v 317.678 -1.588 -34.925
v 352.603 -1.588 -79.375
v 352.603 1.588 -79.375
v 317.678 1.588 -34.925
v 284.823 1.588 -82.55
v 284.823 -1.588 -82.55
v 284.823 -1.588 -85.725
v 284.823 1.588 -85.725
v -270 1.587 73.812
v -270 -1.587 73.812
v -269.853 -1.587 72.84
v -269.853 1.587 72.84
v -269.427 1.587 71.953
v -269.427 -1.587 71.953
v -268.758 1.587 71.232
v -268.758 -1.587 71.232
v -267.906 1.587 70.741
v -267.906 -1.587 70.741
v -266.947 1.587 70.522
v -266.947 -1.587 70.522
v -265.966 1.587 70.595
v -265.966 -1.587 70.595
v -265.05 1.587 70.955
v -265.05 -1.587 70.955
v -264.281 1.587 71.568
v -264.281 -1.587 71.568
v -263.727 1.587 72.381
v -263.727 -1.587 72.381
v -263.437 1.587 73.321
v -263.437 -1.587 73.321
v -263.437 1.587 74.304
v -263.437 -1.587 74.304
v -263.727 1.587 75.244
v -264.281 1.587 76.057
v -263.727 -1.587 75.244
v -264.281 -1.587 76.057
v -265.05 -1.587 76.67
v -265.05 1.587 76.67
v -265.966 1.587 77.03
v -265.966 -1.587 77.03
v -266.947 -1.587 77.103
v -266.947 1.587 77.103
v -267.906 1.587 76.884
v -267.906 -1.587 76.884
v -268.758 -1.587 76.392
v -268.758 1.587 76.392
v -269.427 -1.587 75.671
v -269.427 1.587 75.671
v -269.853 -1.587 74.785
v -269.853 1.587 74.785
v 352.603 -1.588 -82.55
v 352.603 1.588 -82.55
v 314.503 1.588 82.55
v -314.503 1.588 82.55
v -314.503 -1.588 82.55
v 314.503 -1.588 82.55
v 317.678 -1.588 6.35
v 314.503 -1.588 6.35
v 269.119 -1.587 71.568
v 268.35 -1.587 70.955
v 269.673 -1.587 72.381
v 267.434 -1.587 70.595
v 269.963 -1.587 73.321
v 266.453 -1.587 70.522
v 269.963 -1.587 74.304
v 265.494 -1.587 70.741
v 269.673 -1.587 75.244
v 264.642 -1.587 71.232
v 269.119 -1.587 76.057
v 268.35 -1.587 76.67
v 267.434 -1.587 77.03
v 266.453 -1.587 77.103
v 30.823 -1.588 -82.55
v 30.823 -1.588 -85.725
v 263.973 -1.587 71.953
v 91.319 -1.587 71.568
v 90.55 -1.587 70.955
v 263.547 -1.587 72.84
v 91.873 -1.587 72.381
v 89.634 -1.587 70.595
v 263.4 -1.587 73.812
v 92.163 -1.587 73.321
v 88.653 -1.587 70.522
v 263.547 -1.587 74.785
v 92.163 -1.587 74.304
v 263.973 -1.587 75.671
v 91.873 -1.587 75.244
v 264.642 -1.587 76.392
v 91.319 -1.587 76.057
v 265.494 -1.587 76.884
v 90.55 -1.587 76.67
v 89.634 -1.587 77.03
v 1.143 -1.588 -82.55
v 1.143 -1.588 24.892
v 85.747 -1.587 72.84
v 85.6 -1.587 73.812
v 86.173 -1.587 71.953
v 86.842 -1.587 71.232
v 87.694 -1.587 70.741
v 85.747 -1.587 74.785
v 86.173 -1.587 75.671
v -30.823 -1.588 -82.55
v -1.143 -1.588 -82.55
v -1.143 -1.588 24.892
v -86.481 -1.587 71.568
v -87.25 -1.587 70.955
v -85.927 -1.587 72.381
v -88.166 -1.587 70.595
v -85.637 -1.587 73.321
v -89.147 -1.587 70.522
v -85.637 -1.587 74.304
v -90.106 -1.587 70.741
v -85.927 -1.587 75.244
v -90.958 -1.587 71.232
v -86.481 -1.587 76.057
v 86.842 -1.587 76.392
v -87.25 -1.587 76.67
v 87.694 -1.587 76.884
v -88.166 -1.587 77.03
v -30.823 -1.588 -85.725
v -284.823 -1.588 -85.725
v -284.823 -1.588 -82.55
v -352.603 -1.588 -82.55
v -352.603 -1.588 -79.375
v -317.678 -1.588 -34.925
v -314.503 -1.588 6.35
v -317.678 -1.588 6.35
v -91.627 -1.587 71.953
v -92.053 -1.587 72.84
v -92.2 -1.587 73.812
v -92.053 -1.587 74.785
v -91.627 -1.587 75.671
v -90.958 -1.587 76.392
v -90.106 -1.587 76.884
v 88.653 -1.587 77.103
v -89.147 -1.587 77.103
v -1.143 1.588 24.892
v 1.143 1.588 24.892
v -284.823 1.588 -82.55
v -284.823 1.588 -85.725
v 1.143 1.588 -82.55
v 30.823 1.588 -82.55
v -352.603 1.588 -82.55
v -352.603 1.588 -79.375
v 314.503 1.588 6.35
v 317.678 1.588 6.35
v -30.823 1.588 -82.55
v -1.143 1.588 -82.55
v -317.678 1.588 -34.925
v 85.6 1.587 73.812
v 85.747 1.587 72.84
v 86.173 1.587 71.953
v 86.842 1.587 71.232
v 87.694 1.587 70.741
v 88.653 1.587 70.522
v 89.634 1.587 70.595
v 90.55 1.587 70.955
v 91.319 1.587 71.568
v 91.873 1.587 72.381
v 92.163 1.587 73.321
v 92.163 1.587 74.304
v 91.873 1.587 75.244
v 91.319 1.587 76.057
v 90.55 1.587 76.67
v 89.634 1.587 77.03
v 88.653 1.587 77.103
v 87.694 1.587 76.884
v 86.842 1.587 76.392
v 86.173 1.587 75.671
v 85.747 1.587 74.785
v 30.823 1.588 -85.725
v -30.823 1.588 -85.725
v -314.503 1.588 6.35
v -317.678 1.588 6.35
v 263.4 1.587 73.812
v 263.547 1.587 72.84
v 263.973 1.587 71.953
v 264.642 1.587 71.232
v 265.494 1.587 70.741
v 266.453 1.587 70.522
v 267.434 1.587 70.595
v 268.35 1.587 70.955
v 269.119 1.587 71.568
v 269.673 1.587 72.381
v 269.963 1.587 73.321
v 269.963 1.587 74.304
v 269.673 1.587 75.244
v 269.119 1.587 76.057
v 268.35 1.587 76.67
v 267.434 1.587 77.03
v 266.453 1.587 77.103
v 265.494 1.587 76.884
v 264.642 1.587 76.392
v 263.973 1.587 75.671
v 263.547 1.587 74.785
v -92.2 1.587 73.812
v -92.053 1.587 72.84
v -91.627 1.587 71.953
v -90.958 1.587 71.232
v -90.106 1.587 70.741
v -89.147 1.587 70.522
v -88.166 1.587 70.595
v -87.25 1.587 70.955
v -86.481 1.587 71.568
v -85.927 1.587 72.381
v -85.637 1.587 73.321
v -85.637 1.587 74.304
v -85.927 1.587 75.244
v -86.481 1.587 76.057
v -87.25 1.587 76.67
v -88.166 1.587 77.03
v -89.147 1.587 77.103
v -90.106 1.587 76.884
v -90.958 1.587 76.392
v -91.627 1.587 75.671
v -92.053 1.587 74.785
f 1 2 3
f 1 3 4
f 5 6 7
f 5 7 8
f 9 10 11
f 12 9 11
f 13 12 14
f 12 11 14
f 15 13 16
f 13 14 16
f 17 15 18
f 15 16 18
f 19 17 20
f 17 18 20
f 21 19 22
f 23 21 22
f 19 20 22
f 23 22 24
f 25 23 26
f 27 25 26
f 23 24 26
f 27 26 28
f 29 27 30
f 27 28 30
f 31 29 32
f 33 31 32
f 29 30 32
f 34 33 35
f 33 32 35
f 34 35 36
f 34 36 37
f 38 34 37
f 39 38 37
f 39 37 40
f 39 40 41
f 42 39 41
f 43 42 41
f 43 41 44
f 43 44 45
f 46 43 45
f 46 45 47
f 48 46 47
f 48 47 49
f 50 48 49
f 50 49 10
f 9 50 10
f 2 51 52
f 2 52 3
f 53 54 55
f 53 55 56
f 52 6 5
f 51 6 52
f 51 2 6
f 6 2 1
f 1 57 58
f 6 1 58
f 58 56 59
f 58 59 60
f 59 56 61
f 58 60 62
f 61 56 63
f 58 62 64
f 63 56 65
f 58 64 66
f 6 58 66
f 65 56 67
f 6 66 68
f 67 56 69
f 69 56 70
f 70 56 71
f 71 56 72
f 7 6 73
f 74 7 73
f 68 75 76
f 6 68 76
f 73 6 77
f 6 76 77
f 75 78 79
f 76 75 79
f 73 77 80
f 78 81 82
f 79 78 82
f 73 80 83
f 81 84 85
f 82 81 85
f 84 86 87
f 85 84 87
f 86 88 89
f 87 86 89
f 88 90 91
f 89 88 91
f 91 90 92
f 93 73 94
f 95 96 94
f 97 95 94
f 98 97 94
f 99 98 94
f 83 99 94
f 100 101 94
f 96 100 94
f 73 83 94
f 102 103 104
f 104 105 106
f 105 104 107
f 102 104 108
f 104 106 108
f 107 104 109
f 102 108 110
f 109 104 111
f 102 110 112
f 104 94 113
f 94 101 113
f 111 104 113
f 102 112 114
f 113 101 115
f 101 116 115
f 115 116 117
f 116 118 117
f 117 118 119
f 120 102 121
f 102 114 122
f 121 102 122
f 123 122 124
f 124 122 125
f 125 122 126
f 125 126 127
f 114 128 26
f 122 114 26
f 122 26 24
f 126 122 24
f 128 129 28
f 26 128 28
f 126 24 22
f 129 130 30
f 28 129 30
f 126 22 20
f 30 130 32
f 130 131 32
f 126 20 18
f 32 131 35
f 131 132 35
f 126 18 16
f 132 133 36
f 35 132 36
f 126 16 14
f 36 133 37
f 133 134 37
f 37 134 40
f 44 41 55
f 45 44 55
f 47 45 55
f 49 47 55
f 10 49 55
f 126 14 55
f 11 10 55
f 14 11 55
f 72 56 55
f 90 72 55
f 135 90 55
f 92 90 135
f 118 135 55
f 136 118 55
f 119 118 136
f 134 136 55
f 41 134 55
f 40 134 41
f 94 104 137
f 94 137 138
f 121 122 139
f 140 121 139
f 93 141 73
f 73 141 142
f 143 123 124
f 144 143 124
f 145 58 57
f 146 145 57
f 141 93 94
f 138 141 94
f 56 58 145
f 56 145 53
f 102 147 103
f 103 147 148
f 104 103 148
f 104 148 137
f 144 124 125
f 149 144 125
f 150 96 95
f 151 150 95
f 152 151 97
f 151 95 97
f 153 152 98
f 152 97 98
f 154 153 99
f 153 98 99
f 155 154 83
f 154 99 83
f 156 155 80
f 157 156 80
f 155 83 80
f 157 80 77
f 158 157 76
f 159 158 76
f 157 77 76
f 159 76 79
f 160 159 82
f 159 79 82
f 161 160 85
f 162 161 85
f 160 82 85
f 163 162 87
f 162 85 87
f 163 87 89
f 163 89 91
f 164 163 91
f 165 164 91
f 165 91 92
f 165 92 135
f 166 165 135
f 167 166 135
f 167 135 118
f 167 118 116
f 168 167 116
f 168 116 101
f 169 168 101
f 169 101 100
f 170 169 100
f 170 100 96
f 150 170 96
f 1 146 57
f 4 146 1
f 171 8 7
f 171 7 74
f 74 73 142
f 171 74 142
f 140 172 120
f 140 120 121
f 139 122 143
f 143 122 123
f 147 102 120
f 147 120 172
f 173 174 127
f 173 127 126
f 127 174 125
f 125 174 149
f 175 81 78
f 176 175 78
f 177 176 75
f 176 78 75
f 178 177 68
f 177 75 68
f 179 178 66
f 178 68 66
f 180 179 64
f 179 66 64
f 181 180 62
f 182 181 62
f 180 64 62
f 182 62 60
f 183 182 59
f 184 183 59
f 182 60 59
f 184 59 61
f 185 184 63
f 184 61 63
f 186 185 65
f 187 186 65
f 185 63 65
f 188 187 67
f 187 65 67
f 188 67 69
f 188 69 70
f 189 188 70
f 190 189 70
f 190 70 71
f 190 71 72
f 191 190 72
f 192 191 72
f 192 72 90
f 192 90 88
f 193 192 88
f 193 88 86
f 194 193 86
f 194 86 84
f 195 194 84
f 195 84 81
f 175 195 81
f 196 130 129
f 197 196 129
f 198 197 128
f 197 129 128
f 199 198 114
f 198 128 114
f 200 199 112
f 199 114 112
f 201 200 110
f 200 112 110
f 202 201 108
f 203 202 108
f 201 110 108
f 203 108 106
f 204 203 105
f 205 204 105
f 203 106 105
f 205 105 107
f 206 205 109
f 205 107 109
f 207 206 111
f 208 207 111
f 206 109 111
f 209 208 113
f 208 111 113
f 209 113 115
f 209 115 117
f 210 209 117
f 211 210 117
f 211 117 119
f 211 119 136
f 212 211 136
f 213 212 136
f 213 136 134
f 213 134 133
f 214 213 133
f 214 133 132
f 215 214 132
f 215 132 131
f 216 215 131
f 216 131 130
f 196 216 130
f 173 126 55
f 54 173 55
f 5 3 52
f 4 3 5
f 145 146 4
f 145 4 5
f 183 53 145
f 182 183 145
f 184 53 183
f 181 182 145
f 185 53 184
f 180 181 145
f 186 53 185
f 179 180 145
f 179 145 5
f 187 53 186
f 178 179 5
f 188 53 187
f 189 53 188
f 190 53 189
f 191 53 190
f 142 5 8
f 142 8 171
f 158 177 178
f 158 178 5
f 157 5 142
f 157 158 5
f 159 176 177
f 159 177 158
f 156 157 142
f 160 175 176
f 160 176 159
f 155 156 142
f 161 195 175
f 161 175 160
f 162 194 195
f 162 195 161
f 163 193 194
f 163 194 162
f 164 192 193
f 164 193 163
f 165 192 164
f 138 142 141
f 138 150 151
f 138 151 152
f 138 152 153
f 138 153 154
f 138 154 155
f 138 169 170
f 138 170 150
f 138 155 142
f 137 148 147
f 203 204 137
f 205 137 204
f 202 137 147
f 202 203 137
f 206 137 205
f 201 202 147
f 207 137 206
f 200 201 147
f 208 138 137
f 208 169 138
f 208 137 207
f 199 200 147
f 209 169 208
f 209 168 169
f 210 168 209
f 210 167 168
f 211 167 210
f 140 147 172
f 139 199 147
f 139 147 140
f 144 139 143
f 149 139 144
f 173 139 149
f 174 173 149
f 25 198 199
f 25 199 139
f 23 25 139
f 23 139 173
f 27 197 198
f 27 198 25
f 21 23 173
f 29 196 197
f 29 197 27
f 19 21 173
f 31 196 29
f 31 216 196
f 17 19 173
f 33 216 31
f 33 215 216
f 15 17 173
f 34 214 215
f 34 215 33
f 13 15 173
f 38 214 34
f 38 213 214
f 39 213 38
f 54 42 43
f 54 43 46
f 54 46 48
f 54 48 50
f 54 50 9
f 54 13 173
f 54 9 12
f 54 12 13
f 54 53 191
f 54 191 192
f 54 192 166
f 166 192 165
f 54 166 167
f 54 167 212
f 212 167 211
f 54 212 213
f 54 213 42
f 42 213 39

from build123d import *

# Parameters (mm, degrees)
SKETCH1_W            = 635.3556
SKETCH1_H            = 165.1
BOSS_EXTRUDE1_DEPTH  = 1.5875
SKETCH2_W            = 254
SKETCH2_H            = 3.175
BOSS_EXTRUDE2_DEPTH  = 3.175
BOSS_EXTRUDE3_DEPTH  = 3.175
SKETCH5_W            = 3.175
SKETCH5_H            = 76.2
SKETCH5_W_2          = 2.286
SKETCH5_H_2          = 107.442
CUT_EXTRUDE2_DEPTH   = 4.175
M6_CLEARANCE_HOLE1_D = 6.6
LPATTERN2_COUNT      = 4
LPATTERN2_PITCH      = 177.8


with BuildPart() as part:
    # Sketch1 → Boss-Extrude1 (new body, symmetric)
    with BuildSketch(Plane(origin=(0, 0, 0), x_dir=(1, 0, 0), z_dir=(0, 1, 0))):
        Rectangle(SKETCH1_W, SKETCH1_H)
    extrude(amount=BOSS_EXTRUDE1_DEPTH, both=True)

    # Sketch2 → Boss-Extrude2 (add)
    with BuildSketch(Plane(origin=(0, 0, -82.55), x_dir=(-1, 0, 0), z_dir=(0, 0, -1))):
        with Locations((-157.8229, 0)):
            Rectangle(SKETCH2_W, SKETCH2_H)
        with Locations((157.8229, 0)):
            Rectangle(SKETCH2_W, SKETCH2_H)
    extrude(amount=BOSS_EXTRUDE2_DEPTH)

    # Sketch3 → Boss-Extrude3 (add)
    with BuildSketch(Plane.XZ.offset(1.5875)):
        Polygon((317.6778, -82.55), (352.6028, -82.55), (352.6028, -79.375), (317.6778, -34.925), align=None)
    boss_extrude3 = extrude(amount=-BOSS_EXTRUDE3_DEPTH)

    # Mirror1: Boss-Extrude3 across plane
    add(boss_extrude3.mirror(Plane(origin=(0, 0, 0), x_dir=(0, 0, 1), z_dir=(1, 0, 0))))

    # Sketch5 → Cut-Extrude2 (cut, through all)
    with BuildSketch(Plane.XZ.offset(1.5875)):
        with Locations((316.0903, 44.45)):
            Rectangle(SKETCH5_W, SKETCH5_H)
        with Locations((-316.0903, 44.45)):
            Rectangle(SKETCH5_W, SKETCH5_H)
        with Locations((0, -28.829)):
            Rectangle(SKETCH5_W_2, SKETCH5_H_2)
    extrude(amount=-CUT_EXTRUDE2_DEPTH, mode=Mode.SUBTRACT)

    # M6 Clearance Hole1 (through all)
    with Locations(Plane(origin=(0, 1.5875, 0), x_dir=(1, 0, 0), z_dir=(0, 1, 0))):
        with Locations((266.7, -73.8124)):
            m6_clearance_hole1 = Hole(M6_CLEARANCE_HOLE1_D / 2)

    # LPattern2: M6 Clearance Hole1 ×4
    with Locations(*[(-i * LPATTERN2_PITCH, 0, 0) for i in range(1, LPATTERN2_COUNT)]):
        add(m6_clearance_hole1, mode=Mode.SUBTRACT)


solid = part.part
